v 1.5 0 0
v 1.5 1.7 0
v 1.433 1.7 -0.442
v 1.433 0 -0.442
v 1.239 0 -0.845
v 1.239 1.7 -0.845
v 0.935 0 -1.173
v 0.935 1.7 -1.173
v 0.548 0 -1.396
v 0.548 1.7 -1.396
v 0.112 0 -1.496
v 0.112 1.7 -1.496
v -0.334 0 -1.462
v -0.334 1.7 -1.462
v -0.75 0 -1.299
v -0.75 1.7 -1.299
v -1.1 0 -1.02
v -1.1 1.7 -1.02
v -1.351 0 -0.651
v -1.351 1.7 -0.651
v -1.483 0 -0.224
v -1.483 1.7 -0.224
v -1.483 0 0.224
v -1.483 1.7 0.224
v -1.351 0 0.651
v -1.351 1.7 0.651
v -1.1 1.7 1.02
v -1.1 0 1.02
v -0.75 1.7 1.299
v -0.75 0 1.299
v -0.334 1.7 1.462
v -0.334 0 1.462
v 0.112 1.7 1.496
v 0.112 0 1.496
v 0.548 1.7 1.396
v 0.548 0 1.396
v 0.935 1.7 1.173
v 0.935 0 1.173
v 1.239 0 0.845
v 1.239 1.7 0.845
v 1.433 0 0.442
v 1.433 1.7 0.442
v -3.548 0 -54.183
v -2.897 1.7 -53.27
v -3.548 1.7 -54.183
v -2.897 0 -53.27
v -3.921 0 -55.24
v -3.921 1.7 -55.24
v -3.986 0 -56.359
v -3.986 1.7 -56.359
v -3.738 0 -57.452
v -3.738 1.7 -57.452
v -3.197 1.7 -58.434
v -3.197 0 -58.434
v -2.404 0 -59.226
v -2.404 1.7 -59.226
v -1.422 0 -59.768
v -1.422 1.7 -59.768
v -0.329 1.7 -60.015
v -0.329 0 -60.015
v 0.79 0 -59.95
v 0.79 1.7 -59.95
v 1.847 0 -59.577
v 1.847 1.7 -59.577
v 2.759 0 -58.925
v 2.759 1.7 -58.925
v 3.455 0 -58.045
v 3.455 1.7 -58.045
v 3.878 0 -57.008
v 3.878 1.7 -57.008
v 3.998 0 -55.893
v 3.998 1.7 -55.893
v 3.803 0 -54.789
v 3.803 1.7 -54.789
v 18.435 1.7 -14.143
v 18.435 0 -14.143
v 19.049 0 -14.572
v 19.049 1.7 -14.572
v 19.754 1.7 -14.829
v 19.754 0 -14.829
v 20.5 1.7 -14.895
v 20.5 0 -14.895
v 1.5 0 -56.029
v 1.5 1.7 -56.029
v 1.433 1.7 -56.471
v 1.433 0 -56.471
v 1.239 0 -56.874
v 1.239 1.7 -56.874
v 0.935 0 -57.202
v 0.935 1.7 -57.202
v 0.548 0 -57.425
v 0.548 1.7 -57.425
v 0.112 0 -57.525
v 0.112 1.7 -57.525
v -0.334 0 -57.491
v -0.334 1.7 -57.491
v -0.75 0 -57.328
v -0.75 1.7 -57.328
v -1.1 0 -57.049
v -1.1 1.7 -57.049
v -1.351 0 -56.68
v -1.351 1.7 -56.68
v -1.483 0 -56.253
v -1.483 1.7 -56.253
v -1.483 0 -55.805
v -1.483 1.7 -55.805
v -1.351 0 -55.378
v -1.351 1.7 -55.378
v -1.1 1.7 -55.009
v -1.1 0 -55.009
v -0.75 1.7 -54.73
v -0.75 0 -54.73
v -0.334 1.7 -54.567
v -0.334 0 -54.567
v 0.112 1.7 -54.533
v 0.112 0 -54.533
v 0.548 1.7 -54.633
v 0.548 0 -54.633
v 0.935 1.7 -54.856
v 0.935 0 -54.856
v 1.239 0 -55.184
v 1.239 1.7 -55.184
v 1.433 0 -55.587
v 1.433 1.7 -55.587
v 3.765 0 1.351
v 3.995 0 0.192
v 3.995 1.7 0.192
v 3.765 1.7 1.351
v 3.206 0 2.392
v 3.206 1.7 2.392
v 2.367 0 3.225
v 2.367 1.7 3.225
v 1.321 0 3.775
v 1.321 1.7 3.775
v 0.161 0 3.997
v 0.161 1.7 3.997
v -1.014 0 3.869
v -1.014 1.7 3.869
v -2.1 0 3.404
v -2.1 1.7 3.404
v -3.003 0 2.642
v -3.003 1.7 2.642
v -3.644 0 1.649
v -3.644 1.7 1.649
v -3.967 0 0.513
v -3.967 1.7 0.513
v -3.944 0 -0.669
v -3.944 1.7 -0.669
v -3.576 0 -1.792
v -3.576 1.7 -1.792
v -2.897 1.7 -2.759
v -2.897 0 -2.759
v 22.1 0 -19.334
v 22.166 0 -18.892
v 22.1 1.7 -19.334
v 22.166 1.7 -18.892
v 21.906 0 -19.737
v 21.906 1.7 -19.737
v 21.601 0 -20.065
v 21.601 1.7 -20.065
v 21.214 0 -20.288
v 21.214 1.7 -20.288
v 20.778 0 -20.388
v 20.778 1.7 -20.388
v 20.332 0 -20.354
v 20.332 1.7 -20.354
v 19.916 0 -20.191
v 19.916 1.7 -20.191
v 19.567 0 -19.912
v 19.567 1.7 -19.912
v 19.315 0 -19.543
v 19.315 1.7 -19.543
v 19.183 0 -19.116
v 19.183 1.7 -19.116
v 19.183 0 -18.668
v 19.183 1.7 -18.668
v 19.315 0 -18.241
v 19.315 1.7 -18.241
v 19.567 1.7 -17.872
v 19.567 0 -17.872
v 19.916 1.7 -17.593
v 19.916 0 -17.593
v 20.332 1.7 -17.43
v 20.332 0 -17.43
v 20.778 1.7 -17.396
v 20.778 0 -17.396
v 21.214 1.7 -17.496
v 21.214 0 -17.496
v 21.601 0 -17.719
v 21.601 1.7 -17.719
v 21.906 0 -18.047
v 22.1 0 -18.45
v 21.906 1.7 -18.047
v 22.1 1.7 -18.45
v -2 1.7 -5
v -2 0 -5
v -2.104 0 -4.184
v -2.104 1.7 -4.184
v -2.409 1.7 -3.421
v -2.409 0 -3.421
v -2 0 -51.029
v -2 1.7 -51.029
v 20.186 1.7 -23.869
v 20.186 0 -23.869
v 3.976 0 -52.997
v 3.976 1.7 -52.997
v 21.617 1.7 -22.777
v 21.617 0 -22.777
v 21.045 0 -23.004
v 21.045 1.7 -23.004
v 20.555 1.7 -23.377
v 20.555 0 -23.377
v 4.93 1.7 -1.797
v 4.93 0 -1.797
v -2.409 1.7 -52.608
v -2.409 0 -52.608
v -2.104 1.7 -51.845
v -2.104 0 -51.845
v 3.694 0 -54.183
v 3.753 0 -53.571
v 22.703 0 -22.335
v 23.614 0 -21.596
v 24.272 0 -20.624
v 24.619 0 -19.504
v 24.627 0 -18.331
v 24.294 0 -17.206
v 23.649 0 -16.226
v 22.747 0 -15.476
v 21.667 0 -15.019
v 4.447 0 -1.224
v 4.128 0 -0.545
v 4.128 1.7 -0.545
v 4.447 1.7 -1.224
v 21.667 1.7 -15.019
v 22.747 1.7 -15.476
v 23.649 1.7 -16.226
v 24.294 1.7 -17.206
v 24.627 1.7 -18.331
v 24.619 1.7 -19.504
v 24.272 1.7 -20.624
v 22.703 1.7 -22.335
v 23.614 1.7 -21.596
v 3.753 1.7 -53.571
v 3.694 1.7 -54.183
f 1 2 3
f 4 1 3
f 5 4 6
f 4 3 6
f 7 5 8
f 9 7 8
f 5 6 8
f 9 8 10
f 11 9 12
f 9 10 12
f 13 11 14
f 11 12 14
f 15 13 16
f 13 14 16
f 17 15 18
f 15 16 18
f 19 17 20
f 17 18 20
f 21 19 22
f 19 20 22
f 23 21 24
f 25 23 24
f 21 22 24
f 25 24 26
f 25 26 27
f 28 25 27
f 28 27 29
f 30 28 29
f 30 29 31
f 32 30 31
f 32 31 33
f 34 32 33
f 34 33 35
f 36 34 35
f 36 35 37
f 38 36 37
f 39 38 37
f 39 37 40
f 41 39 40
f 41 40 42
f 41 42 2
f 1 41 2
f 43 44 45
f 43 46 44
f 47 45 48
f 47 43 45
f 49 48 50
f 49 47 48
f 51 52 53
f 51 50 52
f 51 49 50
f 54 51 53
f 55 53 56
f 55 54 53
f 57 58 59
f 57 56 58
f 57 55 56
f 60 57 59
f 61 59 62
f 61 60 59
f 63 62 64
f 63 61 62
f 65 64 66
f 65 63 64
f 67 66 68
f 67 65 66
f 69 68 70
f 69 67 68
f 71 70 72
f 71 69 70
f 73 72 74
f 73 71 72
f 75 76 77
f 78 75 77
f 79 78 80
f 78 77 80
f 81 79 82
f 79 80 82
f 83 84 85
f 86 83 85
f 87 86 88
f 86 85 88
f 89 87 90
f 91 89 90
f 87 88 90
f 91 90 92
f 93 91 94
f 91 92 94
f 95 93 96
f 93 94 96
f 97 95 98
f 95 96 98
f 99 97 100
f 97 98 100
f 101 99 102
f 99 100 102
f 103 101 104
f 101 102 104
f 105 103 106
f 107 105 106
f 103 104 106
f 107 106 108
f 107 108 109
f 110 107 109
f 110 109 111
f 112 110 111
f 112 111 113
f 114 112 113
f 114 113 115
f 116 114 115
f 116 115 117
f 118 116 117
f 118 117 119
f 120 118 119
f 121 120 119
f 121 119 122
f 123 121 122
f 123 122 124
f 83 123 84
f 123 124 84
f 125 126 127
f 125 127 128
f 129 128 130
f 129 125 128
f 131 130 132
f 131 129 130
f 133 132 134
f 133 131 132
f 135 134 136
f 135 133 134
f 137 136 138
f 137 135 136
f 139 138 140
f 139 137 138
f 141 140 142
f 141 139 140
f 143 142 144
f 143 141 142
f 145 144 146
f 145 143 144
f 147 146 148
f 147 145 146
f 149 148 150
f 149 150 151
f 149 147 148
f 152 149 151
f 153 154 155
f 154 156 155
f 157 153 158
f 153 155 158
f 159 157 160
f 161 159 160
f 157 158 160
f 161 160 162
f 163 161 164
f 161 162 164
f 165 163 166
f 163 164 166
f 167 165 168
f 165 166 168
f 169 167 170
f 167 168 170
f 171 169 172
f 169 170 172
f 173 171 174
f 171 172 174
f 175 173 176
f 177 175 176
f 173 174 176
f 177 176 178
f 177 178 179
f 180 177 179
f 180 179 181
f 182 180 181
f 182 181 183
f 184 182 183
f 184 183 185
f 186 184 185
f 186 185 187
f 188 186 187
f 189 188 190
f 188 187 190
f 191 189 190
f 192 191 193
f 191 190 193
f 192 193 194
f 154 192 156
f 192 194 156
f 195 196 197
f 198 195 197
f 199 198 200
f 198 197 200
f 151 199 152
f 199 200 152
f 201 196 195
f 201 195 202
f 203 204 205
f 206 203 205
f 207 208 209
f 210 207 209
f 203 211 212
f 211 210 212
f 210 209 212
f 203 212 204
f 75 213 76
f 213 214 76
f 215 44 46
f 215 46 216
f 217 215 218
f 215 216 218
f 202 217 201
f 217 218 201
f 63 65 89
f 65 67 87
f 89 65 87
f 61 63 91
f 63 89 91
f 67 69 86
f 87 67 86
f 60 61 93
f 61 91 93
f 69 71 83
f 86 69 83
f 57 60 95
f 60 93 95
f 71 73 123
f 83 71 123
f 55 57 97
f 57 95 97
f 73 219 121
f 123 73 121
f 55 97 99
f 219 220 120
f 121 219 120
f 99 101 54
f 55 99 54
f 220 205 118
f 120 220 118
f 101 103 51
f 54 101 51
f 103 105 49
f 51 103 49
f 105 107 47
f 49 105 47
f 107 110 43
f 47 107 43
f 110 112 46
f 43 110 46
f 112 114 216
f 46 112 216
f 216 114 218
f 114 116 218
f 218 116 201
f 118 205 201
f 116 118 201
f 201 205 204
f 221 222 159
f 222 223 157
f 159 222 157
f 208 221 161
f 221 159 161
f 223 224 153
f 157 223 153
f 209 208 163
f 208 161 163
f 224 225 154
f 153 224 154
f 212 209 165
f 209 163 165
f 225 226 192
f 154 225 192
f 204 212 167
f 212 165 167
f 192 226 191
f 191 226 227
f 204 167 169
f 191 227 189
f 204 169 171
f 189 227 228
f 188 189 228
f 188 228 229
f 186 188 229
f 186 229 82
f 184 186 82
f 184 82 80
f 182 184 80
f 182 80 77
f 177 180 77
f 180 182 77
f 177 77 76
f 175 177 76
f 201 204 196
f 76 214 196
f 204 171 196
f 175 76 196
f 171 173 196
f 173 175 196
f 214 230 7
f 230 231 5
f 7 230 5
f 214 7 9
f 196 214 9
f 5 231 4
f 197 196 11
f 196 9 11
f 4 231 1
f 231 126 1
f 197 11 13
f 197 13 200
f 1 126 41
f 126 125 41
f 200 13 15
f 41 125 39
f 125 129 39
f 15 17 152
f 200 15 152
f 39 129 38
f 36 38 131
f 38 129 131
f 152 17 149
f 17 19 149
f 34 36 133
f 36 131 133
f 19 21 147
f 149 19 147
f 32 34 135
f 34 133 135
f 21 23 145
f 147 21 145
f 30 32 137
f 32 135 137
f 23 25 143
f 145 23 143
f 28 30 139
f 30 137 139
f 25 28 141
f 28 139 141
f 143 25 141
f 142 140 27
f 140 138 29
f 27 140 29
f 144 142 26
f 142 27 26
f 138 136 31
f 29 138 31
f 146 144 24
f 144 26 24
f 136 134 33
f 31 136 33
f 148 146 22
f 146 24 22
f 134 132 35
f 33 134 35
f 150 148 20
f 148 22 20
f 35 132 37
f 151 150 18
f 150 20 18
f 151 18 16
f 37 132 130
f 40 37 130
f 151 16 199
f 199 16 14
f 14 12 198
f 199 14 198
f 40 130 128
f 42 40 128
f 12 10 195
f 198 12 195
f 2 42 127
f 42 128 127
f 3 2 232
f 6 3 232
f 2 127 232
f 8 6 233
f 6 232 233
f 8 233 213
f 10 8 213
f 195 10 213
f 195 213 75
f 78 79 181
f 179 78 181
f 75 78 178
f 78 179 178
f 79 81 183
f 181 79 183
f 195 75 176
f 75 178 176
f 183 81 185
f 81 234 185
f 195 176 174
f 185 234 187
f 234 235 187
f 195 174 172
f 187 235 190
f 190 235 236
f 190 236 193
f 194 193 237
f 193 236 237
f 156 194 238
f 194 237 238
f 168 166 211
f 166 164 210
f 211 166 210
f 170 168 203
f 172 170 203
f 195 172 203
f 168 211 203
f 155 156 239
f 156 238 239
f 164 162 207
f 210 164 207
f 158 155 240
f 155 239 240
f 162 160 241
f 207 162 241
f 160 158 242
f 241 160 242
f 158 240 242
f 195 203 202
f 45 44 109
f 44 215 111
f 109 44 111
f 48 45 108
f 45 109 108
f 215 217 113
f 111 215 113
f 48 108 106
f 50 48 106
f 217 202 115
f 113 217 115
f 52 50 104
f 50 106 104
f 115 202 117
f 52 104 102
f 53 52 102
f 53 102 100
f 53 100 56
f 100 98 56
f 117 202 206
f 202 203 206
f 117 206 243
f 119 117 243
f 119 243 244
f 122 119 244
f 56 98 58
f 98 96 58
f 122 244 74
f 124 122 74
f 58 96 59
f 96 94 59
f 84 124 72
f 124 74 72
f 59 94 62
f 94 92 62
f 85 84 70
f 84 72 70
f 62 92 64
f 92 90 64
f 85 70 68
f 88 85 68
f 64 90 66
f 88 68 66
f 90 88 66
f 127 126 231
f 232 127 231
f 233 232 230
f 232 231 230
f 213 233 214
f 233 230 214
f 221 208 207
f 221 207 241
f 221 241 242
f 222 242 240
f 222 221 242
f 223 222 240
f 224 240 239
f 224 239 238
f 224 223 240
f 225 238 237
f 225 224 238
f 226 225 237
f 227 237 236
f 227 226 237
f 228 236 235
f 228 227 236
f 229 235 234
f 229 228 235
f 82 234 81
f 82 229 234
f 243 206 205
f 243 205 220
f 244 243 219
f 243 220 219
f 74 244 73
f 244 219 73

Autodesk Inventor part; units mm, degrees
ref_plane "YZ Plane" through (0, 0, 0) normal (1, 0, 0) x (0, 1, 0)
ref_plane "XZ Plane" through (0, 0, 0) normal (0, 1, 0) x (-1, 0, 0)
ref_plane "XY Plane" through (0, 0, 0) normal (0, 0, 1) x (1, 0, 0)
sketch "Sketch1" plane through (0, 0, 0) normal (0, 1, 0) x (-1, 0, 0)
  circle A0 centre (0, 0) radius 4
  line L0 (2, -5) -> (2, -51.029)
  line L1 (-2, -7.543) -> (-2, -44.0823)
  circle A1 centre (0, -56.029) radius 4
  circle A2 centre (-20.6662, -18.892) radius 4
  line L2 (-4.2179, -6.5655) -> (-15.9345, -17.2762)
  line L3 (-4.9298, -1.7969) -> (-18.4353, -14.1429)
  line L4 (-16.6903, -21.9238) -> (-4.0616, -44.6173)
  line L5 (-20.1855, -23.8688) -> (-3.976, -52.9972)
  arc A3 (2.8966, -2.7586) -> (2, -5) centre (5.25, -5) ccw
  arc A4 (2, -51.029) -> (2.8966, -53.2704) centre (5.25, -51.029) ccw
  arc A5 (-4.9298, -1.7969) -> (-3.9954, 0.1924) centre (-6.875, 0.331) ccw
  arc A6 (-20.5001, -14.8954) -> (-18.4353, -14.1429) centre (-20.3803, -12.0152) ccw
  line L6 (0, 0) -> (-20.6662, -18.892) construction
  line L7 (-20.6662, -18.892) -> (0, -56.029) construction
  arc A7 (-15.9345, -17.2762) -> (-16.6663, -18.9207) centre (-14.4164, -18.9369) ccw
  arc A8 (-16.8633, -20.1321) -> (-16.6903, -21.9238) centre (-14.7242, -20.8297) ccw
  arc A9 (-2, -7.543) -> (-4.2179, -6.5655) centre (-3.3243, -7.543) ccw
  arc A10 (-4.0616, -44.6173) -> (-2, -44.0823) centre (-3.1002, -44.0823) ccw
  arc A11 (-20.1855, -23.8688) -> (-21.6168, -22.7774) centre (-22.1516, -24.9629) ccw
  arc A12 (-3.8029, -54.7889) -> (-3.976, -52.9972) centre (-5.942, -54.0913) ccw
  point P0 (-21.4801, -12.8095)
  dimension "d0" = 8
  dimension "d1" = 8
  dimension "d2" = 8
  dimension "d4" = 42.5
  dimension "d5" = 28
  dimension "d6" = 2
  dimension "d7" = 2
  dimension "d8" = 5
  dimension "d10" = 5
  dimension "d11" = 0
  dimension "d12" = 5.2471
  dimension "d14" = 5.247
  dimension "d15" = 2
  dimension "d16" = 2
  dimension "d17" = 2
  dimension "d18" = 2
  dimension "d19" = 4
  dimension "d20" = 5
  dimension "d21" = 5
  dimension "d22" = 5
  dimension "d23" = 1.1002
  dimension "d24" = 1.3243
  dimension "d38" = 56.029
extrude "Extrusion1" add sketch "Sketch1" along normal blind 4 contours A0 | A2 | A1
extrude "Extrusion2" add sketch "Sketch1" along normal blind 1.7 contours A0 A3 L0 A4 A1 A12 L5 A11 A2 A8 L4 A10 L1 A9 L2 A7 A6 L3 A5 | A7 L2 A9 L1 A10 L4 A8 A2
sketch "Sketch2" plane through (0, 4, 0) normal (0, 1, 0) x (1, 0, 0)
  circle A0 centre (0, 0) radius 4 projected
  circle A1 centre (0, 0) radius 1.5
  circle A2 centre (20.6662, 18.892) radius 4 projected
  circle A3 centre (20.6662, 18.892) radius 1.5
  circle A4 centre (0, 56.029) radius 1.5
  circle A5 centre (0, 56.029) radius 4 projected
  dimension "d29" = 3
  dimension "d30" = 3
  dimension "d31" = 3
  dimension "d36" = 0
extrude "Extrusion3" cut sketch "Sketch2" against normal blind 4 contours A1 | A3 | A4
sketch "Sketch3" plane through (-2, 0, -51.029) normal (-1, 0, 0) x (0, 0, 1)
  line L0 (60.4555, 1.7) -> (-13.4083, 1.7)
  line L1 (-13.4083, 1.7) -> (-13.4083, 27.1644)
  line L2 (-13.4083, 27.1644) -> (60.4555, 27.1644)
  line L3 (60.4555, 27.1644) -> (60.4555, 1.7)
  point P0 (51.029, 0)
extrude "Extrusion4" cut sketch "Sketch3" along normal mid plane 100
equation "\"BendRadius\" = Thickness"
equation "\"BendReliefWidth\" = Thickness"
equation "\"BendReliefDepth\" = 0.5 * Thickness"
equation "\"CornerReliefSize\" = 4 * Thickness"
equation "\"MinimumRemnant\" = 2 * Thickness"
equation "\"TransitionRadius\" = BendRadius"
equation "\"JacobiRadiusSize\" = BendRadius"
equation "\"GapSize\" = Thickness"
equation "\"Thickness\" = 3.048"
properties part number "A2P2"
